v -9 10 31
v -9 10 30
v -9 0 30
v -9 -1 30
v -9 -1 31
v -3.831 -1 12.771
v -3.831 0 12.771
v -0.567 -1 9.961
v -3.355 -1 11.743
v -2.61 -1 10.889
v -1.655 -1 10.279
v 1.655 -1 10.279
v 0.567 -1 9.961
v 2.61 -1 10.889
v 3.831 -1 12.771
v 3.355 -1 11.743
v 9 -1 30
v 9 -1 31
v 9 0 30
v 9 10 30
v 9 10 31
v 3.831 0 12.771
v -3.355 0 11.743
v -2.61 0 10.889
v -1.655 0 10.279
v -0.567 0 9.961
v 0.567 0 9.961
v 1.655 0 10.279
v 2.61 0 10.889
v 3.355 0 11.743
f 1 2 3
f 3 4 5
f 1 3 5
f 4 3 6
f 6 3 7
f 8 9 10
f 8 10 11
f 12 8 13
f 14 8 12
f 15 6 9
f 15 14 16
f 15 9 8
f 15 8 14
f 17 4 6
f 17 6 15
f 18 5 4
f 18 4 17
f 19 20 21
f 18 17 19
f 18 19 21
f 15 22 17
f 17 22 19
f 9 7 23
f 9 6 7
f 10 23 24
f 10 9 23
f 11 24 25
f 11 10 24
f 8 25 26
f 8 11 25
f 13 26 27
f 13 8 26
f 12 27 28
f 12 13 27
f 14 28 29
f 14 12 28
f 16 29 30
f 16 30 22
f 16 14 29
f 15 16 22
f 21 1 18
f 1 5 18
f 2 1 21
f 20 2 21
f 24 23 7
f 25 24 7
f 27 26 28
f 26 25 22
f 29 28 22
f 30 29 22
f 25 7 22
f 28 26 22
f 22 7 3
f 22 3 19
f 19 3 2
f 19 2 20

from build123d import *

# Parameters (mm, degrees)
F2_DEPTH      = 1
F3_R          = 4
F4_W          = 18
F4_H          = 1
F5_DEPTH      = 1
F5_DEPTH_BACK = 10


with BuildPart() as f2:
    # F1 (on Front) → F2 (new body)
    with BuildSketch(Plane.XZ):
        Polygon((9, 30), (-9, 30), (0, 0), align=None)
    extrude(amount=F2_DEPTH)

    # F3
    f3_edges = [f2.edges().sort_by_distance(p)[0] for p in [
        (0, -0.5, 0),
    ]]
    fillet(f3_edges, radius=F3_R)

    # F4 (on face) → F5 (join, two sides)
    with BuildSketch(Plane.XZ) as f5_sk:
        with Locations((0, 30.5)):
            Rectangle(F4_W, F4_H)
    extrude(amount=F5_DEPTH)
    extrude(f5_sk.sketch, amount=-F5_DEPTH_BACK)


solid = f2.part
